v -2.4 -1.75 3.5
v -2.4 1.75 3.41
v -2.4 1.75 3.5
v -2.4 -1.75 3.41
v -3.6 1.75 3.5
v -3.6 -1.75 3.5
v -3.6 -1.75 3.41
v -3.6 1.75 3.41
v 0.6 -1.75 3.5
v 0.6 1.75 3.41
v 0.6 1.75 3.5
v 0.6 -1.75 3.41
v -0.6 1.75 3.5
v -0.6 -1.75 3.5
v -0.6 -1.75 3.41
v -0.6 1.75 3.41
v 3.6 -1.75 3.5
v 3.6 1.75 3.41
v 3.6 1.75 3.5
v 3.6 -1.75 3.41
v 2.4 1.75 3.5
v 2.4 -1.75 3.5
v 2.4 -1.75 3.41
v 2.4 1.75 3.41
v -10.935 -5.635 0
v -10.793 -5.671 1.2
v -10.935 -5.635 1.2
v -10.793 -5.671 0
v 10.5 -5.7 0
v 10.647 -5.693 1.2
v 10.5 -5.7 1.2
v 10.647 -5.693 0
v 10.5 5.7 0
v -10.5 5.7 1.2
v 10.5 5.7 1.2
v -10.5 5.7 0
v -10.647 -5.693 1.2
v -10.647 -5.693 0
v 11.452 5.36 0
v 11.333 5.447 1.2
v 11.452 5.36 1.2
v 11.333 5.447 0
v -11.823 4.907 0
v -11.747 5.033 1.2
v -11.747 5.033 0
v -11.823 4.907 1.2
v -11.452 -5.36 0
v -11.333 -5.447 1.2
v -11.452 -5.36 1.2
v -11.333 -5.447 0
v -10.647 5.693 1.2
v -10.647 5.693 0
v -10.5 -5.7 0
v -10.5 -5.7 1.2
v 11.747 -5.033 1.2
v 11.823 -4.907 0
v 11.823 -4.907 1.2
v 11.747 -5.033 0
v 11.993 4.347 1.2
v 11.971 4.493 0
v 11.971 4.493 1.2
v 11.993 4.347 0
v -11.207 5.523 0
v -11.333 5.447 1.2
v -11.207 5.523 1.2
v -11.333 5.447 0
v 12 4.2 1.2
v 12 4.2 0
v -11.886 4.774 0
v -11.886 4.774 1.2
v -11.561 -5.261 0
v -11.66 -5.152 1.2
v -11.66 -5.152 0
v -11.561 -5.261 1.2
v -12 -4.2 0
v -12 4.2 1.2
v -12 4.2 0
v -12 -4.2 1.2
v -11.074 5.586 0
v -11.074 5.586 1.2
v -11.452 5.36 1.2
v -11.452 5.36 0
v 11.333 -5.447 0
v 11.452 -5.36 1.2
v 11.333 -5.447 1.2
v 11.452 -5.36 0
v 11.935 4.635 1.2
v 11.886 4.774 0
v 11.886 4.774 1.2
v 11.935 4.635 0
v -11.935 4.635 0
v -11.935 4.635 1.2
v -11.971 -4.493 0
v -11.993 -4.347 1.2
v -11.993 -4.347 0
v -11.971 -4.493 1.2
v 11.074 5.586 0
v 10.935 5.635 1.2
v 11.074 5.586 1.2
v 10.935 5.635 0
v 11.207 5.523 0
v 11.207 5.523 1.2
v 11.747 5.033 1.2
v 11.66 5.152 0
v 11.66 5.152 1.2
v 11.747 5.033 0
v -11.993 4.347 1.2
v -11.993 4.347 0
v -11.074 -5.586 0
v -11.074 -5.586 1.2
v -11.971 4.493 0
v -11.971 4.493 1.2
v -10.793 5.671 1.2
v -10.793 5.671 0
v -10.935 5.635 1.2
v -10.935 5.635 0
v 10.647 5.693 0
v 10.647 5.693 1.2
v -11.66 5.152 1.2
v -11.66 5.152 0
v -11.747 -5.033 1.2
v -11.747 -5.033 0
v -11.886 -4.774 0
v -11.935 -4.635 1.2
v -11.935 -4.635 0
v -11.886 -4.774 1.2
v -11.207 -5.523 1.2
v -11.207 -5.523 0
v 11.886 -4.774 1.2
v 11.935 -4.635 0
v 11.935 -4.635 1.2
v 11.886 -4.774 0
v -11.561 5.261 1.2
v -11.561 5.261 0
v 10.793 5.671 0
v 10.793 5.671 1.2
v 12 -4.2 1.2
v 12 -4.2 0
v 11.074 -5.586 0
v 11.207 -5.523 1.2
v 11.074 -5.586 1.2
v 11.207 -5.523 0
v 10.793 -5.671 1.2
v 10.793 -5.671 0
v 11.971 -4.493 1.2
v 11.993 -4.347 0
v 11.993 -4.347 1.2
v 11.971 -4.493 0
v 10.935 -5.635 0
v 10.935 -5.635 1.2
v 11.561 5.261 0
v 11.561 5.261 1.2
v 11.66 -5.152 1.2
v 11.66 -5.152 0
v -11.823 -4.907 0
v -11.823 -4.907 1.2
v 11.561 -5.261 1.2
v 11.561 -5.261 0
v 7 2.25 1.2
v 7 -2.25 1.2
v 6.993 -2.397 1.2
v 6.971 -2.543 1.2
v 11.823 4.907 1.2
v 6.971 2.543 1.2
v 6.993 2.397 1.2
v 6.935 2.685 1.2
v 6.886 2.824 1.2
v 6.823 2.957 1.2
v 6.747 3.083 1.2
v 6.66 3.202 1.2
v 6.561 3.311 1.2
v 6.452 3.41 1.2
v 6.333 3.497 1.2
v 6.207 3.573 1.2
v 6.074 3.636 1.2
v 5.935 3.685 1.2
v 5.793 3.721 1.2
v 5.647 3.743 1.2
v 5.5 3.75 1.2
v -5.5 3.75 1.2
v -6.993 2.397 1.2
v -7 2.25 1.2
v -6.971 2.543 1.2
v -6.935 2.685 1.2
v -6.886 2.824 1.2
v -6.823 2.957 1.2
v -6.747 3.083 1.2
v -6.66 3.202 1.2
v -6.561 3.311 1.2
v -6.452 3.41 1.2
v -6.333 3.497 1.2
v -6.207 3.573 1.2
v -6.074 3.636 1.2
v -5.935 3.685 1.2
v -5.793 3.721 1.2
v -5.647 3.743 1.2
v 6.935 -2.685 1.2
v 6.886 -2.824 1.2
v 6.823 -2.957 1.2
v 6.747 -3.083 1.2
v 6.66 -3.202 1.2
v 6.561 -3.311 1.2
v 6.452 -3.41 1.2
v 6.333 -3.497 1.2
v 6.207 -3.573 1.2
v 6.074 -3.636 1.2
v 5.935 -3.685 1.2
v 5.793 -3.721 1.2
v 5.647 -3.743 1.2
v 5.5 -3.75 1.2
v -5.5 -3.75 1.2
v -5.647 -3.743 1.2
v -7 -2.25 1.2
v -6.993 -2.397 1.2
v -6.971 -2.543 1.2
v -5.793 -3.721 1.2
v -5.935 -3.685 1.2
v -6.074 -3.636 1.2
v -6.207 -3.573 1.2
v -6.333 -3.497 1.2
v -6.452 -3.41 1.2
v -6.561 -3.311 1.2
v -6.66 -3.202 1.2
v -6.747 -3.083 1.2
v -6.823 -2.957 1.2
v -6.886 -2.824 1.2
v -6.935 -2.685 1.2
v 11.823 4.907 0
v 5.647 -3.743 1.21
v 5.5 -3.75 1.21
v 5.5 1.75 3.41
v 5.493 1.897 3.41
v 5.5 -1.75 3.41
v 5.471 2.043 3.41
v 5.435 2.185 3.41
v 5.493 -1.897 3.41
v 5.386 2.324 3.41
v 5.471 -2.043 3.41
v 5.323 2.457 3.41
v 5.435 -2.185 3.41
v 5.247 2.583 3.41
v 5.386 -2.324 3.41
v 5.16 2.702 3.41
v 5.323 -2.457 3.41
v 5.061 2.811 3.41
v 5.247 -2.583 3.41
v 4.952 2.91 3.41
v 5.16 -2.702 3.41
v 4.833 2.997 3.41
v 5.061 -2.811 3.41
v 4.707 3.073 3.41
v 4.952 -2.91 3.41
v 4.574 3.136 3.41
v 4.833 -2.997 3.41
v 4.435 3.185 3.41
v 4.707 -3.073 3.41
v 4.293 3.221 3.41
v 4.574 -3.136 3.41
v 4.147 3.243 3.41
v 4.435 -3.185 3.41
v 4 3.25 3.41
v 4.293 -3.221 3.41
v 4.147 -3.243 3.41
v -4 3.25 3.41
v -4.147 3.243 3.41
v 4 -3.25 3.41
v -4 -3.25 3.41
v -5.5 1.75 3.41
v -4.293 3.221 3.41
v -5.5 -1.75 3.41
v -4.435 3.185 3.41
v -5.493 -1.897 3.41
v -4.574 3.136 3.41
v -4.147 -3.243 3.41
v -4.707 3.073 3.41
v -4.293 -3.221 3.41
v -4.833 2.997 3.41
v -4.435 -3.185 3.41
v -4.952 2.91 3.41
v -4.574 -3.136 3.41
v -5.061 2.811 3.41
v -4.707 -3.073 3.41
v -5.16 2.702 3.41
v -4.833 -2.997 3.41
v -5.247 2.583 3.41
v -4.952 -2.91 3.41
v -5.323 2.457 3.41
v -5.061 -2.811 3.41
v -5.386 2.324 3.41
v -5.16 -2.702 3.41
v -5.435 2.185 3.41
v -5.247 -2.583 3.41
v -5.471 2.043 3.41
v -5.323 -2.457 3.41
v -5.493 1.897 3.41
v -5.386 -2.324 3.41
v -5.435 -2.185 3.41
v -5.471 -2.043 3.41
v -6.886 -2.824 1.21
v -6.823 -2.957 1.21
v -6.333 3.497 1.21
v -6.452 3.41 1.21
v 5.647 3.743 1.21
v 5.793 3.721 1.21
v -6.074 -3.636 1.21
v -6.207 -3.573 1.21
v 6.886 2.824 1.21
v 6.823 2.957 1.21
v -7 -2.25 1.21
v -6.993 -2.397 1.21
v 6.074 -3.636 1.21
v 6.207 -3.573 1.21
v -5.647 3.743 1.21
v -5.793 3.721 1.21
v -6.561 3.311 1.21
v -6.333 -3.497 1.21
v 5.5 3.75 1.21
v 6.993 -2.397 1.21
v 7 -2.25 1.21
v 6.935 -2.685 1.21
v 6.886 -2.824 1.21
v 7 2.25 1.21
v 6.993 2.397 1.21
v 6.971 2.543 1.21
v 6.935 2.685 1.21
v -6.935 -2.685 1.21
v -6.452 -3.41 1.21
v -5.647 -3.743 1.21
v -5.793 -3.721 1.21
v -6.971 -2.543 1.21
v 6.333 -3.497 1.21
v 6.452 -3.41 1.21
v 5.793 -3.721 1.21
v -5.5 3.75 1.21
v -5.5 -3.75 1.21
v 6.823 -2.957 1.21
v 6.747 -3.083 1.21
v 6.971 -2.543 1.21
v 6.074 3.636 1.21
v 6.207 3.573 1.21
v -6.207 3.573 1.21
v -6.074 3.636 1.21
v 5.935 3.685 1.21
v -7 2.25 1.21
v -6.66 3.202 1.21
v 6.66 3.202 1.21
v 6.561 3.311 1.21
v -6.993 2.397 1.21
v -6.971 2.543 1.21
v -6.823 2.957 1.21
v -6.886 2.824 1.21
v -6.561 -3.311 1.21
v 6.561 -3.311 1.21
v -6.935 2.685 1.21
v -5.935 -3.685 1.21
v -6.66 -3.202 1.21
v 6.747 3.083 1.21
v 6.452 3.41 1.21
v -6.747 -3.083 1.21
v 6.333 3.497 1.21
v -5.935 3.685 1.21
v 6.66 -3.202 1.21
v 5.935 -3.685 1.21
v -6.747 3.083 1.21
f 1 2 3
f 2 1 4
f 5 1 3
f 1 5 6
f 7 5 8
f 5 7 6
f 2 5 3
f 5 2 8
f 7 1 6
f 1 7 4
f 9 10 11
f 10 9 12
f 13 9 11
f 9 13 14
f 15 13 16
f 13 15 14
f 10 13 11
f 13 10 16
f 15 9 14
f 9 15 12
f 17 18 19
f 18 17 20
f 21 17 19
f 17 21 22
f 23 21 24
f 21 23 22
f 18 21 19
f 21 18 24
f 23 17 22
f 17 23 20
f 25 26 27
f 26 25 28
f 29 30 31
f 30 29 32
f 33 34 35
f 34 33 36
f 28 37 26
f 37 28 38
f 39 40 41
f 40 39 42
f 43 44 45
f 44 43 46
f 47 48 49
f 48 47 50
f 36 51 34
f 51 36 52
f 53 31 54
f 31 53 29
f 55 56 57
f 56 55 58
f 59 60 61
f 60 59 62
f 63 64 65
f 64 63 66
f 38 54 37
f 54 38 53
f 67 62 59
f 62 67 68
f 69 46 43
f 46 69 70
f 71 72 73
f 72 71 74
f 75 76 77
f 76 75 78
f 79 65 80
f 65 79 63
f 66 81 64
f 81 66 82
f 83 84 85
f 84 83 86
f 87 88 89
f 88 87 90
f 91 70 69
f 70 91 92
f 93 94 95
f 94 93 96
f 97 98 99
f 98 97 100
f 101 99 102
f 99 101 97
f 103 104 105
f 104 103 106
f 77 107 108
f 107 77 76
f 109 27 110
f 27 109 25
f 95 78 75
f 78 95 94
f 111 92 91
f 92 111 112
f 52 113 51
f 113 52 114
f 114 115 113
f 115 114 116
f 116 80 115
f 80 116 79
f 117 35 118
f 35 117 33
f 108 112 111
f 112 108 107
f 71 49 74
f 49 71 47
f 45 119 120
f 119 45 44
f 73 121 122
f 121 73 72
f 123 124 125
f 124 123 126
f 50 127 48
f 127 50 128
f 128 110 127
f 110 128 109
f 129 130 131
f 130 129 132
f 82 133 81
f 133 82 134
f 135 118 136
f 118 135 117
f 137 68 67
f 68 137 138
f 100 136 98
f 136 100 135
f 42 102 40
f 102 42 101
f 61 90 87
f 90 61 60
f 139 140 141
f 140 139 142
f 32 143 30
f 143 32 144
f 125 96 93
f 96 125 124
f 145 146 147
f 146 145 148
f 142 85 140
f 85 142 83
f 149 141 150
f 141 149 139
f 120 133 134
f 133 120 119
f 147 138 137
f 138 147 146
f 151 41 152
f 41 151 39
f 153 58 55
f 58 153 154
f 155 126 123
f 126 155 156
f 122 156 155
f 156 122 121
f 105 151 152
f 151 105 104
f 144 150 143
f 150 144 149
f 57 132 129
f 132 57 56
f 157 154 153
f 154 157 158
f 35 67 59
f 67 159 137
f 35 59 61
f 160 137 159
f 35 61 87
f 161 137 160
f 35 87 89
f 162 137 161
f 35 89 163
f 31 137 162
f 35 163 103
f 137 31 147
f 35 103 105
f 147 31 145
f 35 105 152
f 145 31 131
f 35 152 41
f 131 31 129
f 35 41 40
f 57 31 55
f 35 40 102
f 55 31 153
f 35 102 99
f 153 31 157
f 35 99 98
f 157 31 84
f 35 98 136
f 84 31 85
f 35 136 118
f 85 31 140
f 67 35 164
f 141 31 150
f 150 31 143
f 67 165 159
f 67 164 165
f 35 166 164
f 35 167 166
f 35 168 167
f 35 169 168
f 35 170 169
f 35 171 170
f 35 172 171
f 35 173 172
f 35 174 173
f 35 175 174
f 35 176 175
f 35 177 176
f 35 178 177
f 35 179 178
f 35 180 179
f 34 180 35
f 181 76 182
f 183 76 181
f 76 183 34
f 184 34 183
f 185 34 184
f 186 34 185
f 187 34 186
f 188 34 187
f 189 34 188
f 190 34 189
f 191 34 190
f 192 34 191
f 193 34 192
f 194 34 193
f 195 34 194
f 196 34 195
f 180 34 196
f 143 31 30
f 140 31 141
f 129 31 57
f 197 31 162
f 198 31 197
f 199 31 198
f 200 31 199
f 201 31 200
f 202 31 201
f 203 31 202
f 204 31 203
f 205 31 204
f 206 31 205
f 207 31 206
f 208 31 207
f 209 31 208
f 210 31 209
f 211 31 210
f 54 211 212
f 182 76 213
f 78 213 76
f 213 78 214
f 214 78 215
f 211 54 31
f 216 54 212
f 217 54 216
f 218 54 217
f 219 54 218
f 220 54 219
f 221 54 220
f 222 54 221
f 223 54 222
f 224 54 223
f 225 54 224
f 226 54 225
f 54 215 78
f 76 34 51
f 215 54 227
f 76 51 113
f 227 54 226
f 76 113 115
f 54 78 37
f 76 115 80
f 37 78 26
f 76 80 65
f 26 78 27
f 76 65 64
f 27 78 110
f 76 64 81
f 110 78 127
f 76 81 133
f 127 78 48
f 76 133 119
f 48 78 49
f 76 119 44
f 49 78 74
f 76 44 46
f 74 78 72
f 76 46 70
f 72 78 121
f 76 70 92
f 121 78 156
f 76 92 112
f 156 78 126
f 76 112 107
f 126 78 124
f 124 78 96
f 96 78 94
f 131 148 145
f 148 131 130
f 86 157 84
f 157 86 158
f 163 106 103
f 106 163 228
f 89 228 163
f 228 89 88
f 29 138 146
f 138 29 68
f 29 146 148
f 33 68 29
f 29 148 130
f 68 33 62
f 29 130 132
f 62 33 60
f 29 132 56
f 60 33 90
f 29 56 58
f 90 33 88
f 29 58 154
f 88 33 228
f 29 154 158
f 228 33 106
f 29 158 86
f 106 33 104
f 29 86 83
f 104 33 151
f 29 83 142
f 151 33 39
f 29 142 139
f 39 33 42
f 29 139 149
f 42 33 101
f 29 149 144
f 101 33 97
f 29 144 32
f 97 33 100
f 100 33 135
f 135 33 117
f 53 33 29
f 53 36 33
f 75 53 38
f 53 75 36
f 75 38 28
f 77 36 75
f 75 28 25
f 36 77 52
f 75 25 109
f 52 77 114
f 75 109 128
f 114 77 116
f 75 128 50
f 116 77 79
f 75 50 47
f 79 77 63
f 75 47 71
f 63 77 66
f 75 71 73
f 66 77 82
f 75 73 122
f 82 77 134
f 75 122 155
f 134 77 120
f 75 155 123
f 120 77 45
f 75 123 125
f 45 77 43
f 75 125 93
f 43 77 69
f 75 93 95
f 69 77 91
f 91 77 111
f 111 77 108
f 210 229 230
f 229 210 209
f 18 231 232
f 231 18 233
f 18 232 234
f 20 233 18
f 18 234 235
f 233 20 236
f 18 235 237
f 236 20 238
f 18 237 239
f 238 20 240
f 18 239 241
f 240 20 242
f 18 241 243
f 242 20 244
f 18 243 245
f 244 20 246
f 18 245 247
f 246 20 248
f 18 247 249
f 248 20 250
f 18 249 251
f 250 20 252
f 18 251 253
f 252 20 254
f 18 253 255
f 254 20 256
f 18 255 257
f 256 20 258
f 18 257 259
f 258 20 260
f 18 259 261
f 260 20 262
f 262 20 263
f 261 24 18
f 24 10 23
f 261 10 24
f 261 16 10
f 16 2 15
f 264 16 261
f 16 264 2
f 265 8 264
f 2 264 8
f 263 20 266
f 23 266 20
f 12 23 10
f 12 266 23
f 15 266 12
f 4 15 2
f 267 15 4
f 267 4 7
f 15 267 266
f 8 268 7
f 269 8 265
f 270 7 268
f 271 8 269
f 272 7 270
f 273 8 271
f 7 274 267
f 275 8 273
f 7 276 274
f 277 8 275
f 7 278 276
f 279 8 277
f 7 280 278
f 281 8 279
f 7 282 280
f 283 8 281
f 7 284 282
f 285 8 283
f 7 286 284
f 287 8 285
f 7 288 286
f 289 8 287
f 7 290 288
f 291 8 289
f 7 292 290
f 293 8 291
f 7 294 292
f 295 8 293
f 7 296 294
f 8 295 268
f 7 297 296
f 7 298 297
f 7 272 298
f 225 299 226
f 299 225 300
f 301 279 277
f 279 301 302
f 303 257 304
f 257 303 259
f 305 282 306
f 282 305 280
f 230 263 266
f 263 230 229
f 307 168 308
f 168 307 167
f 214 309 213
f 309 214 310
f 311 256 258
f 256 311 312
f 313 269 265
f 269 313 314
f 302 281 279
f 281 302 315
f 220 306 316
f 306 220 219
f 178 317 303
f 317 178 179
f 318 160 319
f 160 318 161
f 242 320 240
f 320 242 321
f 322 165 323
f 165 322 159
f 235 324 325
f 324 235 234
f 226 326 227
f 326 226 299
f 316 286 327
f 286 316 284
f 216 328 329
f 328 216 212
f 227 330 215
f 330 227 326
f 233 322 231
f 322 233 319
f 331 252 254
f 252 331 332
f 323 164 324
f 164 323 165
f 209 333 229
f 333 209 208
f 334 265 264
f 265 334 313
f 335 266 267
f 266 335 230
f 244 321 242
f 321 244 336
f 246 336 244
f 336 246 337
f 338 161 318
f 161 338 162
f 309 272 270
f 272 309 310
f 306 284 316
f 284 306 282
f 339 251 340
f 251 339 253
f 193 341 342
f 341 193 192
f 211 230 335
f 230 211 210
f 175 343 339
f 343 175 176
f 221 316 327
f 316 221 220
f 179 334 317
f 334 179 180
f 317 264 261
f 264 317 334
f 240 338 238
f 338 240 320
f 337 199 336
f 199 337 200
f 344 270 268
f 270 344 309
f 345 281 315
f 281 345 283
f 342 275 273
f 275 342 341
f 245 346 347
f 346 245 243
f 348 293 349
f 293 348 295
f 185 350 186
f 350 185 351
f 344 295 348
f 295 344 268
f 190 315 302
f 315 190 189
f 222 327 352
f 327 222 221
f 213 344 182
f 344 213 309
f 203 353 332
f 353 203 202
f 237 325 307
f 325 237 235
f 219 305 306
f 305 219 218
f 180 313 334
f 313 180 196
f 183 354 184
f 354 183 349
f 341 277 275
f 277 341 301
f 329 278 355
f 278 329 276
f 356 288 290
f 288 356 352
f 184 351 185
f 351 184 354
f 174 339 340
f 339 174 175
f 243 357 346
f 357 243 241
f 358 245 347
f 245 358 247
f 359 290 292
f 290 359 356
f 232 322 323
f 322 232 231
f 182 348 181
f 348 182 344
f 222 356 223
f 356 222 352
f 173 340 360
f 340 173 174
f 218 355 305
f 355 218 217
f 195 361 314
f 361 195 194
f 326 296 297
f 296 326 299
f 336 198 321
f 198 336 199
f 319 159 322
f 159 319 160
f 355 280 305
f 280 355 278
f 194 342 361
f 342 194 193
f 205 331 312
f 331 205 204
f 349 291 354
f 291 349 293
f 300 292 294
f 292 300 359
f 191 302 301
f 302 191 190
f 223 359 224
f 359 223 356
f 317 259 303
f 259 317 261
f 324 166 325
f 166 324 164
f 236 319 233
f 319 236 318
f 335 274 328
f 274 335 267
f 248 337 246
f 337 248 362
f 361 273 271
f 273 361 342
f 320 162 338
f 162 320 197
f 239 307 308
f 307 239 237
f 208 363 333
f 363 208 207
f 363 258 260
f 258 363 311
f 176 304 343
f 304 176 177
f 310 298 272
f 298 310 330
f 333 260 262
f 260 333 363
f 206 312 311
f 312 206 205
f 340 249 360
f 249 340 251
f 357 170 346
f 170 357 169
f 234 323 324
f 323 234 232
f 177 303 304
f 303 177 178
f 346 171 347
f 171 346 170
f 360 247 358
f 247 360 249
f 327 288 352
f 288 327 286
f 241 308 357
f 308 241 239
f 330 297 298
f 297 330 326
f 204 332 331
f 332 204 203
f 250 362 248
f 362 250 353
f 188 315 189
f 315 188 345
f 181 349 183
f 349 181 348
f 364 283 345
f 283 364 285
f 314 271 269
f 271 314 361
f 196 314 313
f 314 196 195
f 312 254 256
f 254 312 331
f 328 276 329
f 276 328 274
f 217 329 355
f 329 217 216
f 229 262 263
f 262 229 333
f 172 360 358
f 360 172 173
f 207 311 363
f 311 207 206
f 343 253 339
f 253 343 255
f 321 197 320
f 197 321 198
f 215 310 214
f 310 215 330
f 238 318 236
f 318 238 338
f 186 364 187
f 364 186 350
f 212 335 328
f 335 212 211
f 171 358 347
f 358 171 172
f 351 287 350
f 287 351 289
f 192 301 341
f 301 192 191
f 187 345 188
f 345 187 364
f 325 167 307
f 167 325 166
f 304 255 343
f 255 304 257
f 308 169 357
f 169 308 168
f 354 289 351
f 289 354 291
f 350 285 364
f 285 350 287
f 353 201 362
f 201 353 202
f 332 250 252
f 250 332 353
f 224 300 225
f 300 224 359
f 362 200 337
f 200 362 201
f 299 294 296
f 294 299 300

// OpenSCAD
// file: ../../sorgenti/libreria.scad
// ============================================================
// libreria.scad — forme di base riusate da tutti i pezzi
// ============================================================
include <parametri.scad>

$fn = RISOLUZIONE;

// Prisma a sezione rettangolare con angoli arrotondati.
module piastra(x, y, h, r) {
    linear_extrude(height = h)
        offset(r = r) square([x - 2*r, y - 2*r], center = true);
}

// Scatola piena con angoli verticali arrotondati (rv) e bordo
// superiore raccordato (rt). Il raccordo è approssimato a gradini
// uniti con hull(): resta liscio e si stampa senza supporti.
module scatola_arrotondata(x, y, z, rv, rt, passi = 12) {
    union() {
        piastra(x, y, z - rt, rv);
        for (i = [0 : passi - 1]) {
            a0 = 90 * i / passi;
            a1 = 90 * (i + 1) / passi;
            k0 = rt * (1 - cos(a0));  k1 = rt * (1 - cos(a1));
            h0 = rt * sin(a0);        h1 = rt * sin(a1);
            hull() {
                translate([0, 0, z - rt + h0])
                    piastra(x - 2*k0, y - 2*k0, 0.02, max(rv - k0, 0.6));
                translate([0, 0, z - rt + h1])
                    piastra(x - 2*k1, y - 2*k1, 0.02, max(rv - k1, 0.6));
            }
        }
    }
}

// Foro di passaggio per vite con svasatura della testa (testa in basso,
// si avvita dal basso verso l'alto).
module foro_svasato(h = 10, d = VITE_FORO, testa_d = VITE_TESTA_D, testa_h = 1.6) {
    translate([0, 0, -0.1]) cylinder(h = h + 0.2, d = d);
    translate([0, 0, -0.1]) cylinder(h = testa_h + 0.1, d1 = testa_d, d2 = d);
}

// Pilastrino con sede per inserto a caldo M2,5 (si inserisce dal basso).
module boss_inserto(h = 12, d = BOSS_D) {
    difference() {
        cylinder(h = h, d = d);
        translate([0, 0, -0.1]) cylinder(h = INSERTO_H + 0.1, d = INSERTO_D);
        // scarico sopra l'inserto, per la punta della vite
        translate([0, 0, INSERTO_H]) cylinder(h = h, d = VITE_D + 0.4);
    }
}

// Griglia di fori a nido d'ape dentro un cerchio di diametro d_area.
module griglia_tonda(d_area, spessore, d_foro = ALT_GRIGLIA_D, passo = 3.2) {
    n = ceil(d_area / passo) + 2;
    for (i = [-n : n], j = [-n : n]) {
        x = i * passo + (abs(j) % 2) * passo / 2;
        y = j * passo * 0.866;
        if (sqrt(x*x + y*y) <= (d_area - d_foro) / 2)
            translate([x, y, -0.1]) cylinder(h = spessore + 0.2, d = d_foro);
    }
}

// Fessura allungata (slot) con estremi arrotondati, asse X.
module fessura(lung, larg, h) {
    hull() {
        translate([-(lung - larg)/2, 0, 0]) cylinder(h = h, d = larg);
        translate([ (lung - larg)/2, 0, 0]) cylinder(h = h, d = larg);
    }
}

// Scritta in rilievo (per i provini e le etichette).
module scritta(t, dim = 6, alt = 0.6) {
    linear_extrude(height = alt)
        text(t, size = dim, halign = "center", valign = "center",
             font = "Helvetica:style=Bold");
}

// Freccia piena, punta verso +X, usata per le icone dei tasti.
module freccia(lung = 16, larg = 14, alt = 0.8) {
    gambo = larg / 5;          // mezza larghezza del gambo
    testa = lung * 0.45;       // lunghezza della punta
    linear_extrude(height = alt)
        polygon([[-lung/2, -gambo], [lung/2 - testa, -gambo],
                 [lung/2 - testa, -larg/2], [lung/2, 0],
                 [lung/2 - testa, larg/2], [lung/2 - testa, gambo],
                 [-lung/2, gambo]]);
}

// Icona "volume": tre barrette crescenti, asse X.
module icona_volume(n = 3, alt = 0.8, passo = 3.2, base = 2.0, cresc = 1.6) {
    for (i = [0 : n - 1])
        translate([i * passo, 0, 0])
            linear_extrude(height = alt)
                square([1.8, base + i * cresc], center = true);
}

// Cava a sezione rettangolare arrotondata, asse di estrusione Y.
// Utile per finestre e fessure nelle pareti verticali.
module cava_y(x, z, prof, r = 1.5) {
    rotate([90, 0, 0])
        linear_extrude(height = prof, center = true)
            offset(r = r) square([x - 2*r, z - 2*r], center = true);
}

// Pilastrino che parte dal piano del fondo e ospita un inserto a caldo
// (inserito dal basso). La punta conica in alto lo rende stampabile
// anche a scatola capovolta.
module boss_fondo(h = 12) {
    union() {
        difference() {
            cylinder(h = h, d = BOSS_D);
            translate([0, 0, -0.1]) cylinder(h = INSERTO_H + 0.1, d = INSERTO_D);
            translate([0, 0, INSERTO_H]) cylinder(h = h, d = VITE_D + 0.6);
        }
        translate([0, 0, h]) cylinder(h = BOSS_D/2, d1 = BOSS_D, d2 = 0.4);
    }
}

// Pilastrino appeso al soffitto (coperchio): l'inserto entra dal basso.
module boss_soffitto(h = 7) {
    difference() {
        translate([0, 0, -h]) cylinder(h = h, d = BOSS_D);
        translate([0, 0, -h - 0.1]) cylinder(h = INSERTO_H + 0.1, d = INSERTO_D);
    }
}

// Maschio della coda di rondine: si infila nella cava della fiancata.
// Si stampa in verticale insieme al raccoglitore, quindi senza supporti.
module coda_maschio(altezza) {
    gioco = 0.35;
    rotate([-90, 0, 0])
        linear_extrude(height = altezza)
            polygon([[0, -(CODA_FONDO - gioco)/2], [0, (CODA_FONDO - gioco)/2],
                     [CODA_PROF - 0.3, (CODA_BOCCA - gioco)/2],
                     [CODA_PROF - 0.3, -(CODA_BOCCA - gioco)/2]]);
}
// file: parametri-v2.scad
// ============================================================
// parametri-v2.scad — console da viaggio (variante v2)
// ------------------------------------------------------------
// Alternativa al cubo: si tiene con due mani, carte e dischi si
// infilano in una fessura sul bordo superiore, la collezione sta
// in un vano sul retro.
//
// Le misure del cubo (parametri.scad) restano valide per tutto
// quello che non cambia: componenti, tolleranze, viti, cursore,
// tasti, altoparlante, LED. Qui c'è solo ciò che è diverso.
// ============================================================
include <../../sorgenti/parametri.scad>

// ---------- corpo ----------
V2_X         = 180;   // larghezza: due mani
V2_Z         = 110;   // altezza
V2_Y         = 45;    // spessore
V2_RAGGIO    = 10;    // raggio degli angoli, generoso: si prende e cade
V2_PARETE    = 2.4;
V2_SPLIT     = 26;    // a che profondità si dividono i due gusci (dal fronte)

// ---------- fessura ----------
// La carta entra di lato corto e ne sporge un centimetro: così la
// spira del tag, che corre lungo il bordo della CR80, finisce tutta
// davanti all'antenna. Prima l'idea era infilarla di lato lungo per
// metà, e la lettura restava un'incognita.
V2_FESS_LARG  = CARTA_X + 2.4;      // 88,0: ci passa anche il disco Ø60
V2_FESS_SPESS = 5.4;                // carta 0,84, disco 4: passa tutto
V2_SPORGE     = 10;                 // quanto resta fuori per afferrare
V2_FESS_PROF  = CARTA_Y - V2_SPORGE + 6;  // 50: tasca sotto la fessura
V2_IMBUTO     = 2.5;                // svasatura d'ingresso, per infilare al buio

// ---------- antenna e schermo ----------
V2_PN_Y       = 9;    // dove sta il PN5180, dal fronte

// ---------- comandi sul fronte ----------
V2_TASTO_X    = 67;   // sotto i pollici
V2_TASTO_Z    = 70;   // alti: sotto restano liberi i 52 mm della camera
// Altoparlante in basso e un po' a destra: sopra c'e' la tasca della
// fessura (la sua cava taglierebbe la camera acustica) e a sinistra passa
// il cursore. Fuori centro si nota appena, e il suono non cambia.
V2_ALT_X      = 38;
V2_ALT_Z      = 26;
V2_LED_X      = -62;  // fra la vite d'angolo e la tasca della fessura
V2_LED_Z      = 100;  // in alto a sinistra
// Il cursore del volume sta sulla faccia, in basso a sinistra, come sul
// cubo: con la griglia spostata a destra i 69 mm della sua corsa ci stanno.
V2_CURSORE_X  = -41;  // in basso a sinistra, lontano dalla camera acustica
V2_CURSORE_VITI = CURSORE_LUNG/2 + 4.5;   // dove si avvita la culla
V2_CURSORE_COLLARE = CURSORE_CORSA + 14;  // piu' stretto che sul cubo: il
                                          // bordo e' lungo 180 e il collare
                                          // largo non ci starebbe
V2_CURSORE_Z  = 34;   // sulla faccia, sotto i tasti e a sinistra della griglia

// ---------- vano della collezione, sul retro ----------
V2_VANO_X     = 96;   // ci stanno 6 carte in piedi, o 3 dischi
V2_VANO_Z     = 64;
V2_VANO_PROF  = 13;
V2_VANO_X0    = 30;   // spostato a destra: a sinistra c'è la batteria
V2_VANO_Z0    = 30;

// ---------- USB-C e porticina, sul bordo inferiore ----------
// Sotto il vano, non sotto la batteria: li' c'e' posto per il TP4056.
V2_USB_X      = 20;
// Il tunnel e' piu' largo che sul cubo (11 x 6) perche' qui la presa resta
// quattro millimetri dentro: deve passarci il guscio dello spinotto, non
// solo la punta.
V2_USB_W      = 13.0;
V2_USB_H      = 7.5;
// Porticina scorrevole, stessa idea del cubo ma piu' bassa: il bordo
// inferiore e' profondo 19 mm e la gola del cubo ne vuole 16, resterebbero
// due binari da 1,5 mm. Con 12 i binari sono 3,5 e tengono.
V2_SPORT_X1   = -32;  // la cava va da qui...
V2_SPORT_X2   = 20;   // ...a qui: 52 mm, la porticina ne occupa 24
V2_SPORT_APERTURA  = 9;    // fessura a vista
V2_SPORT_GOLA      = 12;   // cava interna: la porticina non si sfila
V2_SPORT_PROF_APE  = 1.6;
V2_SPORT_PROF_GOLA = 3.0;
V2_SPORT_PAD  = 3.4;  // ispessimento interno: 2,4 non bastano per la gola

// ---------- comandi dell'adulto, sul retro ----------
// Sul cubo interruttore e tasto genitori stanno sotto il fondo, dove la
// mano di un bambino non arriva mentre gioca. Qui un sotto non c'e':
// vanno sul retro, nella fascia sotto il vano, che quando la console e'
// appoggiata guarda il tavolo. Per premere il tasto genitori bisogna
// sollevarla, ed e' esattamente il gesto che serve.
V2_SW_X       = 62;   // interruttore generale, in basso a destra
V2_SW_Z       = 14;
V2_GEN_X      = -66;  // tasto genitori, in basso a sinistra
V2_GEN_Z      = 10;

// ---------- disposizione interna ----------
// La batteria sta in piedi lungo il fianco sinistro, a cavallo dei due
// gusci: da sola la meta' posteriore e' profonda 16,6 mm e il
// portabatteria ne vuole 20. Le culle la tengono da entrambe le parti,
// che per una versione da viaggio e' anche meglio.
// In orizzontale il portabatteria (78 mm) non ci starebbe: fra la parete
// sinistra e il vano della collezione ce ne sono 70. Quindi va in piedi.
V2_BATT_X     = -70;
V2_BATT_Z     = 55;
V2_BATT_Y     = 32;    // a cavallo dello stacco (26): la culla e' divisa

V2_BASETTA_X  = 36;    // stretta: ci sta la DevKitC-1 (63 x 25) per il verso
V2_BASETTA_Z  = 80;    // lungo, con una decina di millimetri per i fili
V2_BASETTA_CX = -38;   // fra la batteria e il vano
V2_BASETTA_CZ = 55;
V2_BASETTA_Y  = 6;     // quanto sta sollevata dal fondo del guscio posteriore

V2_TP_X       = 20;    // modulo di ricarica, allineato alla presa
V2_TP_Z       = 18;    // alzato: sotto passa l'ispessimento della porticina

// ---------- ferrite ----------
V2_FERRITE_X  = 60;    // ritagliata piu' grande della spira dell'antenna
V2_FERRITE_Z  = 50;
V2_FERRITE_SP = 0.5;
// main file
// ============================================================
// sportello-usb-v2.scad — porticina della presa, versione console
// ------------------------------------------------------------
// Stessa idea di quella del cubo: scorre nella cava del bordo
// inferiore e non si sfila, perché dentro la gola è più alta
// della fessura a vista. Qui è più bassa (gola 12 invece di 16):
// il bordo della console è profondo 19 mm e con la gola del cubo
// resterebbero due binari da 1,5 mm.
//
// Perché scorrevole e non un tappo: un tappo si perde, e passa
// dal calibro delle parti piccole (Ø31,7). Questa no, perché non
// esce dalla console.
//
// STAMPA: appoggiata, bottoncino verso l'alto. Niente supporti.
// Se scorre dura, 0,1 mm in meno di SPORT_SPESS e si rifà.
// ============================================================
include <parametri-v2.scad>
include <../../sorgenti/libreria.scad>

sportello_v2();

module sportello_v2() {
    altezza = V2_SPORT_GOLA - 0.6;   // gioco nella cava
    lung = 24;
    union() {
        // piastrina che corre nella gola
        linear_extrude(height = SPORT_SPESS)
            offset(r = 1.5) square([lung - 3, altezza - 3], center = true);
        // bottoncino che sporge dalla fessura: è la presa per il dito
        translate([0, 0, SPORT_SPESS - 0.01])
            hull() {
                linear_extrude(height = 0.02)
                    offset(r = 1.5) square([11, V2_SPORT_APERTURA - 4.5], center = true);
                translate([0, 0, SPORT_PRESA])
                    linear_extrude(height = 0.02)
                        offset(r = 1.5) square([8, V2_SPORT_APERTURA - 5.5], center = true);
            }
        // righine antiscivolo sul bottoncino
        for (i = [-1, 0, 1])
            translate([i * 3, 0, SPORT_SPESS + SPORT_PRESA - 0.3])
                cube([1.2, V2_SPORT_APERTURA - 5.5, 0.8], center = true);
    }
}
